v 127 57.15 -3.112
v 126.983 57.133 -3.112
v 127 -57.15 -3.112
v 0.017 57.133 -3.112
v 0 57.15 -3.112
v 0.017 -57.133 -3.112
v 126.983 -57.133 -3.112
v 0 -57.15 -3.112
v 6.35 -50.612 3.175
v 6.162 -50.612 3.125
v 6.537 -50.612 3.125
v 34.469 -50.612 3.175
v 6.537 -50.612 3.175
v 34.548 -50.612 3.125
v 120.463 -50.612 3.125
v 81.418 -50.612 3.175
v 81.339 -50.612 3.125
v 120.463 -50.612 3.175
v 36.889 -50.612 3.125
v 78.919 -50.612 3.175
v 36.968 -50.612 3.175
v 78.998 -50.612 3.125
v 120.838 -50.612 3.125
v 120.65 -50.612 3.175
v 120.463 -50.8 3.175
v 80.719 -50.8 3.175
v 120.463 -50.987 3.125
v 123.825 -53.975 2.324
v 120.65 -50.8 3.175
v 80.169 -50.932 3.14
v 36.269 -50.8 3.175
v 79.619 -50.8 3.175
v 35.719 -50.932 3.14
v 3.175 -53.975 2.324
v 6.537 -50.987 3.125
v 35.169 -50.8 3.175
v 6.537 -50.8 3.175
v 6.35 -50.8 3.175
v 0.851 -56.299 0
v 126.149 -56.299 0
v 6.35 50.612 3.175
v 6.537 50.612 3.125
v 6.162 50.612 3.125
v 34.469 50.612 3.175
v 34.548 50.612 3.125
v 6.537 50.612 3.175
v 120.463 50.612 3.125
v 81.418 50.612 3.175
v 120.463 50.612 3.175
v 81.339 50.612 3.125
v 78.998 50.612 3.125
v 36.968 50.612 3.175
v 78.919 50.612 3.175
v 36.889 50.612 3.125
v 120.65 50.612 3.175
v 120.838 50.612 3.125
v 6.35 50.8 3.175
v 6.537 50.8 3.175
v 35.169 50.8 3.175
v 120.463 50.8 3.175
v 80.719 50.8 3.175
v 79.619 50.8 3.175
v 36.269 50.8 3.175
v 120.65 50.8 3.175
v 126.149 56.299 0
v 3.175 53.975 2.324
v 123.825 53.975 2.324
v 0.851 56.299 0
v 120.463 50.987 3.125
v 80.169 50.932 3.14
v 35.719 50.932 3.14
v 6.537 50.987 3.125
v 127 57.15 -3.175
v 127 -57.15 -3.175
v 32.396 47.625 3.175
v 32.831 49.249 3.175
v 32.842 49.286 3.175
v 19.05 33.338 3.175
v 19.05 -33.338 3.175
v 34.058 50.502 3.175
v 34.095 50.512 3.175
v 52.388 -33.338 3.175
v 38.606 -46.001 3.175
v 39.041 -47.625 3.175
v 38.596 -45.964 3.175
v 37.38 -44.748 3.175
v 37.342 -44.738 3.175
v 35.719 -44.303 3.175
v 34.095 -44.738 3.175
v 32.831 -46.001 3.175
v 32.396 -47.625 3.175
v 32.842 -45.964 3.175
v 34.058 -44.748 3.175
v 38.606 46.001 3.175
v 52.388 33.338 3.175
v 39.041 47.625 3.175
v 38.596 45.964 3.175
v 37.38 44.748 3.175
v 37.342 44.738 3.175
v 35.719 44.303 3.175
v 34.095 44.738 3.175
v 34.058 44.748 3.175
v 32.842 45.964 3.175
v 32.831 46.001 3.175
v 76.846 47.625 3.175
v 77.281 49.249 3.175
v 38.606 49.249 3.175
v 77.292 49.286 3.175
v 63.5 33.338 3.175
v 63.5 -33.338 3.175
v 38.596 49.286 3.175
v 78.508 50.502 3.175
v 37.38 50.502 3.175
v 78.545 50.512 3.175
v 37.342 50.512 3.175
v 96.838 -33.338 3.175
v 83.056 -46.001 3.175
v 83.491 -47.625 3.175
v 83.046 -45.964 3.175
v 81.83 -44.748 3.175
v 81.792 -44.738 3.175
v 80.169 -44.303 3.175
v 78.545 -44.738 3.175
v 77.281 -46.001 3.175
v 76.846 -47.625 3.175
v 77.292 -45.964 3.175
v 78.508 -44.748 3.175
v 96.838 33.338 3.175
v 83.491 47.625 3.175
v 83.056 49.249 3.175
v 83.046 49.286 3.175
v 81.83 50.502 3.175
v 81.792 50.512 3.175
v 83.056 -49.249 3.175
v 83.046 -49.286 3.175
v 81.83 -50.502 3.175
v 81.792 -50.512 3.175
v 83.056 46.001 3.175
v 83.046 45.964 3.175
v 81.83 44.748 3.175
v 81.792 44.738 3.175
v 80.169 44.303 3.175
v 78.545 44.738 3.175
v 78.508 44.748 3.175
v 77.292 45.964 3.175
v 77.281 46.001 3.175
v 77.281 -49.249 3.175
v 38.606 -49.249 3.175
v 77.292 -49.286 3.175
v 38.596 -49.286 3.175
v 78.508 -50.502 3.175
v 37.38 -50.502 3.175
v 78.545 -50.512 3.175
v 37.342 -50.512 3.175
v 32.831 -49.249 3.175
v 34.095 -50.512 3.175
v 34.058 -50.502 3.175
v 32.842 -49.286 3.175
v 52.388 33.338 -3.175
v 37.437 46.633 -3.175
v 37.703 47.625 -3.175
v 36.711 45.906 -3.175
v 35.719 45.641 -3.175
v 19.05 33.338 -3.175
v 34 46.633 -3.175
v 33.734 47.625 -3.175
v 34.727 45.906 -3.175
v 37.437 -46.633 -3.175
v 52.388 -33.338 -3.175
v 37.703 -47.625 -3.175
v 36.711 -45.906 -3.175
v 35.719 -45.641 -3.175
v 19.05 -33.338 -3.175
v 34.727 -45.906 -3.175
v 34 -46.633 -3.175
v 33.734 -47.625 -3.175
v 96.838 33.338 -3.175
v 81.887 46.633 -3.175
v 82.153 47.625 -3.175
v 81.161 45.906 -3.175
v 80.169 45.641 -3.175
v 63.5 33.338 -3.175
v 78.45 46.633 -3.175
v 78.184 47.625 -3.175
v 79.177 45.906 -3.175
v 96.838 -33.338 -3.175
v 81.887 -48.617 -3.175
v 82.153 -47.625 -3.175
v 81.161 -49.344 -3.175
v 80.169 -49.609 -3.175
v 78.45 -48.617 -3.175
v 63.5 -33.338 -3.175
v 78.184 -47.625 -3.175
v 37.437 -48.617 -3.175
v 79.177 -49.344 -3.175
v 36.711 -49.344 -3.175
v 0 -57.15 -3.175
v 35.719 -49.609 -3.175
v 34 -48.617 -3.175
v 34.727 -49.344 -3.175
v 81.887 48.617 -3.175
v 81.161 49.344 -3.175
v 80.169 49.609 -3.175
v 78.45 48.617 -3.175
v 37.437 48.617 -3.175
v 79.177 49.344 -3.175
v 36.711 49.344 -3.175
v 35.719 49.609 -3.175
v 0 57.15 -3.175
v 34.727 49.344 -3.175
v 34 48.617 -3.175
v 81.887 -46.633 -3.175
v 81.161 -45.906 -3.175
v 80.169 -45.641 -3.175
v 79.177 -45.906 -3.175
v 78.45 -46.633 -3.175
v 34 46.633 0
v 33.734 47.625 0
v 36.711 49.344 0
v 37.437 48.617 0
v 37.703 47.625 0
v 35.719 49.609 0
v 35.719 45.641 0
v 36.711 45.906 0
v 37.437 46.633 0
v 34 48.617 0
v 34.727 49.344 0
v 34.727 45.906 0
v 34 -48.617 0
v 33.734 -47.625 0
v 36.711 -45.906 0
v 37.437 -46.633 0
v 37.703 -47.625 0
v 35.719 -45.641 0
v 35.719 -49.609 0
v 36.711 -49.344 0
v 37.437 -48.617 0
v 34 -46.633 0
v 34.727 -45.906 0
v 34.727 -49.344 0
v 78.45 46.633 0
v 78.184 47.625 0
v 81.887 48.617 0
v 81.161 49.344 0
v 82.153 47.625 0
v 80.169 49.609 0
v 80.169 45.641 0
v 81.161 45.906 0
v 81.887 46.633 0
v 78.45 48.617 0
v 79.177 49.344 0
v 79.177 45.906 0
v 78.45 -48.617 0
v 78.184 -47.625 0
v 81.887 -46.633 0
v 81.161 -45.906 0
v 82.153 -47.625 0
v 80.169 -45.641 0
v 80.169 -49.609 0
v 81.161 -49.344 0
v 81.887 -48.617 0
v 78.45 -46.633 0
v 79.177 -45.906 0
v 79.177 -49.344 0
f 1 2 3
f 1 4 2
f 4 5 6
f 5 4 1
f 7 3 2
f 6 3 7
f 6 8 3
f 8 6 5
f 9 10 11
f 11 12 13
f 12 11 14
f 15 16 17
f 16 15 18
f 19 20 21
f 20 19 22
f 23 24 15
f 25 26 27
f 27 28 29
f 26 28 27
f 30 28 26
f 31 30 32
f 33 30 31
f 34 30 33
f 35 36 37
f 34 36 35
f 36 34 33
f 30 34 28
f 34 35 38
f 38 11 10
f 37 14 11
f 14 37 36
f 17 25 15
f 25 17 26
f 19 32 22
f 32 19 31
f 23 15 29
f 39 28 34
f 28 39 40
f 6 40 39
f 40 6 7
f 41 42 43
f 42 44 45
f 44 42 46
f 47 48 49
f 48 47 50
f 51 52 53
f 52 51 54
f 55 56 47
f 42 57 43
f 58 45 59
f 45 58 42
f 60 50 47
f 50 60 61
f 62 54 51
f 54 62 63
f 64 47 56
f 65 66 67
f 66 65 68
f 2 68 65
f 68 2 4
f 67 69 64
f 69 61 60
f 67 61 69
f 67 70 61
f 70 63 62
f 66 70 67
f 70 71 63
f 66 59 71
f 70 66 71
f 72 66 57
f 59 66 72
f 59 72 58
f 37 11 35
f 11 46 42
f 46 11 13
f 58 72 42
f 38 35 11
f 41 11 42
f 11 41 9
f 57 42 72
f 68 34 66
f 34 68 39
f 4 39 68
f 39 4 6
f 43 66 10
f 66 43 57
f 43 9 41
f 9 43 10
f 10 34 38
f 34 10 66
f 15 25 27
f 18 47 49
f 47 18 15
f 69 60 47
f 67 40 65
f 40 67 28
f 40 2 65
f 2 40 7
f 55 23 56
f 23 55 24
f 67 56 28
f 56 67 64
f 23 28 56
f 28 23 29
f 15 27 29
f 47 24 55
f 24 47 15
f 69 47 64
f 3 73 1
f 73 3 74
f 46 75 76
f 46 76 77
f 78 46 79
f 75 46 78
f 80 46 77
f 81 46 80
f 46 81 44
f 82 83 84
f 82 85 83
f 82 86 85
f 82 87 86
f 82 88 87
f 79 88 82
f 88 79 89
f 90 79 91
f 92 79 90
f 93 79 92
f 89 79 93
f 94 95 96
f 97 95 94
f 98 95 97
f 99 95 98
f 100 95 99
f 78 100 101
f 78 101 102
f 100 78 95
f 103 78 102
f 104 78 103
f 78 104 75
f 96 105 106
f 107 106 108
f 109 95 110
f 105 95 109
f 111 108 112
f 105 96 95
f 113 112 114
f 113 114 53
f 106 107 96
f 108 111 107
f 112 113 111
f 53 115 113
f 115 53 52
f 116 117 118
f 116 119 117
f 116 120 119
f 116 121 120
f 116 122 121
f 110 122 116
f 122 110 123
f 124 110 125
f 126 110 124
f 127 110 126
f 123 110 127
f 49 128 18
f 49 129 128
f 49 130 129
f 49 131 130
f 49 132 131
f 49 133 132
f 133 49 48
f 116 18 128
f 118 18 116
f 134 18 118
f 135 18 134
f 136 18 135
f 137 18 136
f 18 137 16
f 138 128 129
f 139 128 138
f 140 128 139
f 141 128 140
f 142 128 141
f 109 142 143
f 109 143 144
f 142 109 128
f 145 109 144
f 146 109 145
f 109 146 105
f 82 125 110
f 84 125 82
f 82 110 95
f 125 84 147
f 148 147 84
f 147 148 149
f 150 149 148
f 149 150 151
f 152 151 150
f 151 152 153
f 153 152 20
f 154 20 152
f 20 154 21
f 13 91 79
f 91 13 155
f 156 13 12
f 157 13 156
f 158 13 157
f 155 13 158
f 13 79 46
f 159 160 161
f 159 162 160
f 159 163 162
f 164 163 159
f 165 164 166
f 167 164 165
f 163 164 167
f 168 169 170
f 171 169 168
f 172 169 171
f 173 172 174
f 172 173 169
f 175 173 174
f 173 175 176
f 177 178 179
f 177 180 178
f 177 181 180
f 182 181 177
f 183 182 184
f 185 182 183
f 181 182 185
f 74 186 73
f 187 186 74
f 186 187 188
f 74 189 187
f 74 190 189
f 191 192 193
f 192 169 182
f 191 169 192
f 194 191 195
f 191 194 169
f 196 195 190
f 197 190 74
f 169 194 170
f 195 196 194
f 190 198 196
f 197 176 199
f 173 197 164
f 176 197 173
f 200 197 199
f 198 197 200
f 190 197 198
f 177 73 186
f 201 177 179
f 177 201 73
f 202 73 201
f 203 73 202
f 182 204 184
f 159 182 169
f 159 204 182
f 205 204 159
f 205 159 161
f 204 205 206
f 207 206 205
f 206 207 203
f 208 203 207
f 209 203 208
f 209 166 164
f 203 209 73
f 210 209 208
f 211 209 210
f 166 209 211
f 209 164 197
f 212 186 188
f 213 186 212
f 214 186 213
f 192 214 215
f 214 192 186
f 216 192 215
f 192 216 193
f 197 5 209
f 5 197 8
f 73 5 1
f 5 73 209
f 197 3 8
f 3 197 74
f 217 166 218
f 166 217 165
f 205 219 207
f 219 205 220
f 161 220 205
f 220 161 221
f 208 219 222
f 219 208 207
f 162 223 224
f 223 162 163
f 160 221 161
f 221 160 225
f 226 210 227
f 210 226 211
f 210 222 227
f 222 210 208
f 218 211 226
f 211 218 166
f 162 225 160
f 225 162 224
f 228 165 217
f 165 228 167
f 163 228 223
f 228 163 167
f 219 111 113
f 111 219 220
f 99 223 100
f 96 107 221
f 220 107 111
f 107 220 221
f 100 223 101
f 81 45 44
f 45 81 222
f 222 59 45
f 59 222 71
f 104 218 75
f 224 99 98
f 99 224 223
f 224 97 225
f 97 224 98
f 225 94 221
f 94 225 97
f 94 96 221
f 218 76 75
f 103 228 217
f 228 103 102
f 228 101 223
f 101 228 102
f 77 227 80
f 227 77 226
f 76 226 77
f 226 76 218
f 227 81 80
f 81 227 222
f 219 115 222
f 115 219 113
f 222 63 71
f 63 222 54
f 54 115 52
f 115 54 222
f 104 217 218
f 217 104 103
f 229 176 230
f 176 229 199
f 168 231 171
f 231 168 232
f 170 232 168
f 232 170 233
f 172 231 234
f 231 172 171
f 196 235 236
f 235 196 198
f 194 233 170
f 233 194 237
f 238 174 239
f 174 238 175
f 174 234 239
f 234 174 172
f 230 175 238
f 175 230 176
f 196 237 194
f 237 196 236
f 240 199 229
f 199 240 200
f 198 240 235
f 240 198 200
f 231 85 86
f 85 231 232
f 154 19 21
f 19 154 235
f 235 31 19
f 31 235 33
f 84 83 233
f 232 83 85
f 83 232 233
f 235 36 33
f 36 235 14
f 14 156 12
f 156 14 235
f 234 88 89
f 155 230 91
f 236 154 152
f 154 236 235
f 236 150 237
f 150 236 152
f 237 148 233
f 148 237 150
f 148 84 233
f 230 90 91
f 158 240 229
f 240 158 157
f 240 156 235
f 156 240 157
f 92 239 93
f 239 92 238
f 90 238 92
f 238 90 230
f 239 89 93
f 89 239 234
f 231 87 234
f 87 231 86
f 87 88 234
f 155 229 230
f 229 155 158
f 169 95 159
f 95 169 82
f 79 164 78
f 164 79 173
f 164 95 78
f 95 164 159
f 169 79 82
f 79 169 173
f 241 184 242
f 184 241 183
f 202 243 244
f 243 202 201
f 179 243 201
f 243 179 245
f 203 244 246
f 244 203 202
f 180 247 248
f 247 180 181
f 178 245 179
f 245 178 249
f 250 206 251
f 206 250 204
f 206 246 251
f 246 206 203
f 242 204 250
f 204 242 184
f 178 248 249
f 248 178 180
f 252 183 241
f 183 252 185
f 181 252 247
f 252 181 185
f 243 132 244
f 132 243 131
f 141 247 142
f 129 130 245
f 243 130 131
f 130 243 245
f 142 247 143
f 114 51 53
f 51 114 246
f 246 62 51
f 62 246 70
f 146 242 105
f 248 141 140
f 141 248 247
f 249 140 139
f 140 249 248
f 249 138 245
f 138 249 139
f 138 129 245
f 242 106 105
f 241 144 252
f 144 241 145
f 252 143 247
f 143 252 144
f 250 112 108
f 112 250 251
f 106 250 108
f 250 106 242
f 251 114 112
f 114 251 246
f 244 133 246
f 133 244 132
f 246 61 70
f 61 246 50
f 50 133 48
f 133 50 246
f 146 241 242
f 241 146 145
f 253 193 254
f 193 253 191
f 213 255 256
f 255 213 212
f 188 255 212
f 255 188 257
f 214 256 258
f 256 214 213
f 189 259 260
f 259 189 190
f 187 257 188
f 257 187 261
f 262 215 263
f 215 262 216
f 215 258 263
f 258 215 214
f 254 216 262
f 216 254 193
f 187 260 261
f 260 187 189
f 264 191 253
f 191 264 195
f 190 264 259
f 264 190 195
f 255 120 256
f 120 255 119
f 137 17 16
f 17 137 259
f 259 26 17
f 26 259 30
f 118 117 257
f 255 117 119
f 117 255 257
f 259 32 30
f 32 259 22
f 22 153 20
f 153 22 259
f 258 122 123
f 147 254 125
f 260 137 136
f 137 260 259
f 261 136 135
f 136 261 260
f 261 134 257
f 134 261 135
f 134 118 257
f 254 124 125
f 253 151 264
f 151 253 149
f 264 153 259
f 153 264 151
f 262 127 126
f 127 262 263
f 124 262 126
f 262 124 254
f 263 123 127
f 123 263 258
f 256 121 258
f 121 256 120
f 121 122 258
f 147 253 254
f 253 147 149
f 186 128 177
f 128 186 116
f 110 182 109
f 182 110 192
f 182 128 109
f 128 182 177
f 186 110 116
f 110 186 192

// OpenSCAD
joinfactor = 0.125;
goldenratio = 1.61803399;

gThickness = 1/4 * 25.4;
gRoundingRadius = 1/2/2*25.4;

gStandardWidth = 2.75*25.4;
g1GangWidth = 2.75*25.4;
g2GangWidth = 4.5*25.4;
gStandardHeight = 4.5 * 25.4;

gFixtureHoleDistance = 2.375*25.4;		// The separation between holes when a fixture is being covered
gFixtureHoleIR =5/32/2*25.4;
gFixtureHoleOR = 6.75/2;

gLightSwitchHeight = 0.942*25.4;		// The height of a light switch
gLightSwitchWidth = 0.406 * 25.4;		// The width of a light switch

//
// Examples
//
//roundedplate(gStandardWidth, gStandardHeight, gThickness);

//plug_nema5();
//outlet_nema5_15();
//Duplex_Standard_ngang(1);

//Switch();
//Toggle_Standard_ngang(1);
//Toggle_Standard_ngang(3);

//GFCI();
GFCI_Standard_ngang(2);

//Toggle_Duplex_Standard();


//===============================
//  Modules
//===============================
module roundedplate(width, height, thickness)
{
	smooth = 12;

	difference()
	{
		cube([width, height, thickness], center=true);

		translate([0, -height/2+gRoundingRadius, thickness/2-gRoundingRadius])
		{
			difference()
			{
				translate([0, -gRoundingRadius+joinfactor, gRoundingRadius+joinfactor])
				cube([width+joinfactor*2, gRoundingRadius*2+joinfactor, gRoundingRadius*2+joinfactor], center=true);

				rotate([0, 90, 0])
				cylinder(r=gRoundingRadius, h=width+4*joinfactor, center=true, $fn=smooth);
			}
		}

		translate([0, height/2-gRoundingRadius, thickness/2-gRoundingRadius])
		{
			difference()
			{
				translate([0, gRoundingRadius-joinfactor, gRoundingRadius+joinfactor])
				cube([width+joinfactor*2, gRoundingRadius*2+joinfactor, gRoundingRadius*2+joinfactor], center=true);

				rotate([0, 90, 0])
				cylinder(r=gRoundingRadius, h=width+4*joinfactor, center=true, $fn=smooth);
			}
		}


		// Negative X along Y
		translate([-width/2+gRoundingRadius, 0, thickness/2-gRoundingRadius])
		{
			difference()
			{
				translate([-gRoundingRadius+joinfactor, 0, gRoundingRadius+joinfactor])
				cube([gRoundingRadius*2+joinfactor, height+joinfactor*2, gRoundingRadius*2+joinfactor], center=true);

				rotate([90, 0, 0])
				cylinder(r=gRoundingRadius, h=height+4*joinfactor, center=true, $fn=smooth);
			}
		}

		// Positive X along Y
		translate([width/2-gRoundingRadius, 0, thickness/2-gRoundingRadius])
		{
			difference()
			{
				translate([gRoundingRadius-joinfactor, 0, gRoundingRadius+joinfactor])
				cube([gRoundingRadius*2+joinfactor, height+joinfactor*2, gRoundingRadius*2+joinfactor], center=true);

				rotate([90, 0, 0])
				cylinder(r=gRoundingRadius, h=height+4*joinfactor, center=true, $fn=smooth);
			}
		}
	}
}

// A screw with a tapered head.  Used to subtract screw holes from the plate
module insetscrew()
{
	translate([0, 0, 0])
	cylinder(r=gFixtureHoleIR, h=gThickness+2*joinfactor, center=true, $fn = 12);

	translate([0,0, 0])
	cylinder(r1=gFixtureHoleIR, r2=gFixtureHoleOR, h=gThickness/2+joinfactor, $fn = 12);
}

//==============================================
// Toggle Switch
//==============================================

module Switch()
{
	union()
	{
		cube(size=[gLightSwitchWidth, gLightSwitchHeight, gThickness+2*joinfactor], center=true);

		translate([0, gFixtureHoleDistance/2, 0])
		insetscrew();

		translate([0, -gFixtureHoleDistance/2, 0])
		insetscrew();
	}	
}

module Toggle_Standard_ngang(gangs)
{
	edge = (1+3/8)*25.4;
	toggleseparation = 1.75 * 25.4;

	width = edge*2+((gangs-1)*toggleseparation);
	height = gStandardHeight;
	thickness = gThickness;

	difference()
	{
		translate([width/2, 0, 0])
		roundedplate(width, height, thickness);
	
		for (plate=[0:gangs-1])
		{
			translate([edge +plate*toggleseparation, 0, 0])
			Switch();
		}
	}
}

//===================================
// Nema 5 Plug
//===================================

module plug_nema5()
{
	plugradius = ((1+3/8)*25.4)/2;
	flatradius = ((1+1/8)*25.4)/2;

	difference()
	{
		cylinder(r=plugradius, h=gThickness+2*joinfactor, center=true);
	
		translate([0, plugradius/2 +flatradius, 0])
		cube(size=[plugradius*2, plugradius, gThickness+4*joinfactor], center=true);

		translate([0, -plugradius/2 -flatradius, 0])
		cube(size=[plugradius*2, plugradius, gThickness+4*joinfactor], center=true);
	}
}

module outlet_nema5_15()
{
	plugradius = 34/2;
	flatradius = ((1+1/8)*25.4)/2;
	outerseparation = 2.77*25.4;
	plugoffset = outerseparation/2;

	translate([0, plugoffset-flatradius, 0])
	plug_nema5();

	// Mounting screw in the middle
	insetscrew();

	translate([0, -plugoffset+flatradius, 0])
	plug_nema5();

}

module Duplex_Standard_ngang(gangs)
{
	edge = (1+3/8)*25.4;
	separation = 1.75 * 25.4;

	width = edge*2+((gangs-1)*separation);
	height = gStandardHeight;
	thickness = gThickness;

	difference()
	{
		translate([width/2, 0, 0])
		roundedplate(width, height, thickness);

		for (plate=[0:gangs-1])
		{
			translate([edge +plate*separation, 0, 0])
			outlet_nema5_15();
		}

	}
}

//=============================================
// GFCI
//=============================================

module GFCI()
{
	mountholeseparation = 3.75*25.4;

	holewidth = 1.3125*25.4;	// 1 5/16"
	holeheight = (2+(5/8))*25.4;

	translate([holewidth/2, 0, 0])
	union()
	{
		translate([0, mountholeseparation/2, 0])
		insetscrew();
	
		cube(size=[holewidth, holeheight, gThickness+2*joinfactor], center=true);
	
		translate([0, -mountholeseparation/2, 0])
		insetscrew();
	}
}

module GFCI_Standard_ngang(gangs)
{
	edge = 0.75*25.4;
	separation = 1.75 * 25.4;

	holewidth = 1.3125*25.4;
	holeheight = (2+(5/8))*25.4;

	width = edge*2+(separation*(gangs));
	height = gStandardHeight;
	thickness = gThickness;

	difference()
	{
		translate([width/2, 0, 0])
		roundedplate(width, height, thickness);

		for (plate=[0:gangs-1])
		{
			translate([edge+plate*separation, 0, 0])
			GFCI();
		}
	}
}

//=============================================
// Combinations
//=============================================
module Toggle_Duplex_Standard()
{
	edge = (1+3/8)*25.4;
	separation = 1.75 * 25.4;

		width = edge*2+((2-1)*separation);
	height = gStandardHeight;
	thickness = gThickness;

	difference()
	{
		translate([width/2, 0, 0])
		roundedplate(width, height, thickness);

		translate([edge+0*separation, 0, 0])
		Switch();

		translate([edge+1*separation, 0, 0])
		outlet_nema5_15();
	}

}
